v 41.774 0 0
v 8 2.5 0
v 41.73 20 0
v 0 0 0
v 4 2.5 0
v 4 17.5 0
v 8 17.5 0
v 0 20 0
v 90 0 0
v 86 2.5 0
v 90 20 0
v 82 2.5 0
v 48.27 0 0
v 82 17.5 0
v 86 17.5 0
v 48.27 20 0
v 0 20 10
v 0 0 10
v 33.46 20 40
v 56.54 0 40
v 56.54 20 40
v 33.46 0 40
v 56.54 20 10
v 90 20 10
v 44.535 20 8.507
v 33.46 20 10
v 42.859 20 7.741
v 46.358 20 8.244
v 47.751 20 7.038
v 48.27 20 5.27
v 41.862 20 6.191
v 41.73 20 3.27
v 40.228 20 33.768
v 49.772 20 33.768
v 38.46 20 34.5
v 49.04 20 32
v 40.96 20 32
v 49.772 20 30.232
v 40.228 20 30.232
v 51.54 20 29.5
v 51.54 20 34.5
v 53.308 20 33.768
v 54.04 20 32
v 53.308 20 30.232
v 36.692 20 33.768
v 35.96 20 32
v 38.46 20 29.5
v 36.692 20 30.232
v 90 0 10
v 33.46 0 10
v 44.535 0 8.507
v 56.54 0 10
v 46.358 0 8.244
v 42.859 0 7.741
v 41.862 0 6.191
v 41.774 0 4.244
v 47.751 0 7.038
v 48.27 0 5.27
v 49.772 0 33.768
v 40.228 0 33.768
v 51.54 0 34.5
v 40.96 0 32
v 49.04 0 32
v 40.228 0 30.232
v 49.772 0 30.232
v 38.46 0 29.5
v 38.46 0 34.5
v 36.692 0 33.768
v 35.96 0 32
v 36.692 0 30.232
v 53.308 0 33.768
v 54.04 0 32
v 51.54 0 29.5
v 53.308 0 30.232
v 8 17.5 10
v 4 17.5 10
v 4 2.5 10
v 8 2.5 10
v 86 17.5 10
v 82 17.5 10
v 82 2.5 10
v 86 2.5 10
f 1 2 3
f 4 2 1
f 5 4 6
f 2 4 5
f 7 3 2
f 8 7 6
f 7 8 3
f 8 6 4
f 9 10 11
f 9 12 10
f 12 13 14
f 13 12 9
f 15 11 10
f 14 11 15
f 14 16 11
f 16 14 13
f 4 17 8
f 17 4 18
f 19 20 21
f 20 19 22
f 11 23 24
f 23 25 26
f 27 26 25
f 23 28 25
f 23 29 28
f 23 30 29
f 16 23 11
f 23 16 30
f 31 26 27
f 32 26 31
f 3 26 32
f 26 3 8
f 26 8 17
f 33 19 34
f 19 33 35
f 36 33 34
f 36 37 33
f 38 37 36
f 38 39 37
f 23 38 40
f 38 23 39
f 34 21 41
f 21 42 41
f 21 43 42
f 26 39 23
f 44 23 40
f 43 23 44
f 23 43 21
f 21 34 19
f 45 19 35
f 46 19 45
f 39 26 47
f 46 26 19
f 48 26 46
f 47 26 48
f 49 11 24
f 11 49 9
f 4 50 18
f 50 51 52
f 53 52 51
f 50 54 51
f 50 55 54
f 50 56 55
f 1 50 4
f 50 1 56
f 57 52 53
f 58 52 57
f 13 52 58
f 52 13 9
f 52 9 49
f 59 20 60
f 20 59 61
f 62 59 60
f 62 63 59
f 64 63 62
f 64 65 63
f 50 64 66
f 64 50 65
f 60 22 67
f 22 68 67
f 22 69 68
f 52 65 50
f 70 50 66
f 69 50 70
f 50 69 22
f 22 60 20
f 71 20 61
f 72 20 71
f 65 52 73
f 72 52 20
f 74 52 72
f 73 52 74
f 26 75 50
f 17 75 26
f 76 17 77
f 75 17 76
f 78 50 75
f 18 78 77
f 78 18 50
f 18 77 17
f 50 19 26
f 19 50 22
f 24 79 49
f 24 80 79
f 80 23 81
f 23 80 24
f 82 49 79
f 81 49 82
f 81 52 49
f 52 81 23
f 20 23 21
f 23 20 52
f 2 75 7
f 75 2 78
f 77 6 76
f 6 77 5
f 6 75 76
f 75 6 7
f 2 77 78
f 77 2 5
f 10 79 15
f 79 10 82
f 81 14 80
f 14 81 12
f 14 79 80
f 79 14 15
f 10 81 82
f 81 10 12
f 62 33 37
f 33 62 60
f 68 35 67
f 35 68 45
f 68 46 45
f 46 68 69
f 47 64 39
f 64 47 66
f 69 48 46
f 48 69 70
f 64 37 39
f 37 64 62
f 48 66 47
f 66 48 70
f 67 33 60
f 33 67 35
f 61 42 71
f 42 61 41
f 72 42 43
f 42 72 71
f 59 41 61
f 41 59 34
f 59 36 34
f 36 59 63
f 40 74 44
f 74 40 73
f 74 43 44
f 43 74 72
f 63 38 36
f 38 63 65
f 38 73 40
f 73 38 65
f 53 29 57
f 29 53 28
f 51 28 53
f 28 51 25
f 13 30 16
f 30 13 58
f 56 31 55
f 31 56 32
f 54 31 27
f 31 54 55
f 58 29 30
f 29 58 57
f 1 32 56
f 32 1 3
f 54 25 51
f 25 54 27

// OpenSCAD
//********************
syringediameter= 6.54;

//Large and medium
//sideflapwidth= 90- syringediameter - 45;
//Small
sideflapwidth= 90- syringediameter - 50;

//***************
syringeradius= syringediameter/2;
widthofpart=20;
//sideflapwidth= 15;




difference(){
translate([0,0,20])
    linear_extrude(
    height = 40, 
    center = true, 
    convexity = 10, 
    twist = 0)
    square([90,widthofpart]);
    
//Origin box    
translate([0,0,25])
    linear_extrude(
    height = 30, 
    center = true, 
    convexity = 10, 
    twist = 0)
    square([sideflapwidth,widthofpart]);
    
//Right side box
translate([90- sideflapwidth,0,25])
    linear_extrude(
    height = 30, 
    center = true, 
    convexity = 10, 
    twist = 0)
    square([sideflapwidth,widthofpart]);
    
//Origin woodscrew

     

//center hole square  
translate([6-2, widthofpart/2 - 7.5, 0])
    cube([4,15, widthofpart]); 



//Right woodscrew
 //center hole square  
translate([90-6-2, widthofpart/2 - 7.5, 0])
    cube([4,15, widthofpart]); 


//Top origin screw
translate([sideflapwidth + 5, widthofpart, 32])
rotate([90,0,0])
cylinder (h=widthofpart*2, r=2.5);

//Top right screw
translate([90-sideflapwidth-5, widthofpart, 32])
rotate([90,0,0])
cylinder (h=widthofpart*2, r=2.5);


hull(){
//Center hole circle
translate([45, widthofpart, syringeradius+2])
rotate([90,0,0])
cylinder (h=widthofpart*3, r=syringeradius);
     

//center hole square  
translate([45-syringeradius,widthofpart, -10])
    cube([syringeradius*2,10, syringeradius+10]); 
}

}
